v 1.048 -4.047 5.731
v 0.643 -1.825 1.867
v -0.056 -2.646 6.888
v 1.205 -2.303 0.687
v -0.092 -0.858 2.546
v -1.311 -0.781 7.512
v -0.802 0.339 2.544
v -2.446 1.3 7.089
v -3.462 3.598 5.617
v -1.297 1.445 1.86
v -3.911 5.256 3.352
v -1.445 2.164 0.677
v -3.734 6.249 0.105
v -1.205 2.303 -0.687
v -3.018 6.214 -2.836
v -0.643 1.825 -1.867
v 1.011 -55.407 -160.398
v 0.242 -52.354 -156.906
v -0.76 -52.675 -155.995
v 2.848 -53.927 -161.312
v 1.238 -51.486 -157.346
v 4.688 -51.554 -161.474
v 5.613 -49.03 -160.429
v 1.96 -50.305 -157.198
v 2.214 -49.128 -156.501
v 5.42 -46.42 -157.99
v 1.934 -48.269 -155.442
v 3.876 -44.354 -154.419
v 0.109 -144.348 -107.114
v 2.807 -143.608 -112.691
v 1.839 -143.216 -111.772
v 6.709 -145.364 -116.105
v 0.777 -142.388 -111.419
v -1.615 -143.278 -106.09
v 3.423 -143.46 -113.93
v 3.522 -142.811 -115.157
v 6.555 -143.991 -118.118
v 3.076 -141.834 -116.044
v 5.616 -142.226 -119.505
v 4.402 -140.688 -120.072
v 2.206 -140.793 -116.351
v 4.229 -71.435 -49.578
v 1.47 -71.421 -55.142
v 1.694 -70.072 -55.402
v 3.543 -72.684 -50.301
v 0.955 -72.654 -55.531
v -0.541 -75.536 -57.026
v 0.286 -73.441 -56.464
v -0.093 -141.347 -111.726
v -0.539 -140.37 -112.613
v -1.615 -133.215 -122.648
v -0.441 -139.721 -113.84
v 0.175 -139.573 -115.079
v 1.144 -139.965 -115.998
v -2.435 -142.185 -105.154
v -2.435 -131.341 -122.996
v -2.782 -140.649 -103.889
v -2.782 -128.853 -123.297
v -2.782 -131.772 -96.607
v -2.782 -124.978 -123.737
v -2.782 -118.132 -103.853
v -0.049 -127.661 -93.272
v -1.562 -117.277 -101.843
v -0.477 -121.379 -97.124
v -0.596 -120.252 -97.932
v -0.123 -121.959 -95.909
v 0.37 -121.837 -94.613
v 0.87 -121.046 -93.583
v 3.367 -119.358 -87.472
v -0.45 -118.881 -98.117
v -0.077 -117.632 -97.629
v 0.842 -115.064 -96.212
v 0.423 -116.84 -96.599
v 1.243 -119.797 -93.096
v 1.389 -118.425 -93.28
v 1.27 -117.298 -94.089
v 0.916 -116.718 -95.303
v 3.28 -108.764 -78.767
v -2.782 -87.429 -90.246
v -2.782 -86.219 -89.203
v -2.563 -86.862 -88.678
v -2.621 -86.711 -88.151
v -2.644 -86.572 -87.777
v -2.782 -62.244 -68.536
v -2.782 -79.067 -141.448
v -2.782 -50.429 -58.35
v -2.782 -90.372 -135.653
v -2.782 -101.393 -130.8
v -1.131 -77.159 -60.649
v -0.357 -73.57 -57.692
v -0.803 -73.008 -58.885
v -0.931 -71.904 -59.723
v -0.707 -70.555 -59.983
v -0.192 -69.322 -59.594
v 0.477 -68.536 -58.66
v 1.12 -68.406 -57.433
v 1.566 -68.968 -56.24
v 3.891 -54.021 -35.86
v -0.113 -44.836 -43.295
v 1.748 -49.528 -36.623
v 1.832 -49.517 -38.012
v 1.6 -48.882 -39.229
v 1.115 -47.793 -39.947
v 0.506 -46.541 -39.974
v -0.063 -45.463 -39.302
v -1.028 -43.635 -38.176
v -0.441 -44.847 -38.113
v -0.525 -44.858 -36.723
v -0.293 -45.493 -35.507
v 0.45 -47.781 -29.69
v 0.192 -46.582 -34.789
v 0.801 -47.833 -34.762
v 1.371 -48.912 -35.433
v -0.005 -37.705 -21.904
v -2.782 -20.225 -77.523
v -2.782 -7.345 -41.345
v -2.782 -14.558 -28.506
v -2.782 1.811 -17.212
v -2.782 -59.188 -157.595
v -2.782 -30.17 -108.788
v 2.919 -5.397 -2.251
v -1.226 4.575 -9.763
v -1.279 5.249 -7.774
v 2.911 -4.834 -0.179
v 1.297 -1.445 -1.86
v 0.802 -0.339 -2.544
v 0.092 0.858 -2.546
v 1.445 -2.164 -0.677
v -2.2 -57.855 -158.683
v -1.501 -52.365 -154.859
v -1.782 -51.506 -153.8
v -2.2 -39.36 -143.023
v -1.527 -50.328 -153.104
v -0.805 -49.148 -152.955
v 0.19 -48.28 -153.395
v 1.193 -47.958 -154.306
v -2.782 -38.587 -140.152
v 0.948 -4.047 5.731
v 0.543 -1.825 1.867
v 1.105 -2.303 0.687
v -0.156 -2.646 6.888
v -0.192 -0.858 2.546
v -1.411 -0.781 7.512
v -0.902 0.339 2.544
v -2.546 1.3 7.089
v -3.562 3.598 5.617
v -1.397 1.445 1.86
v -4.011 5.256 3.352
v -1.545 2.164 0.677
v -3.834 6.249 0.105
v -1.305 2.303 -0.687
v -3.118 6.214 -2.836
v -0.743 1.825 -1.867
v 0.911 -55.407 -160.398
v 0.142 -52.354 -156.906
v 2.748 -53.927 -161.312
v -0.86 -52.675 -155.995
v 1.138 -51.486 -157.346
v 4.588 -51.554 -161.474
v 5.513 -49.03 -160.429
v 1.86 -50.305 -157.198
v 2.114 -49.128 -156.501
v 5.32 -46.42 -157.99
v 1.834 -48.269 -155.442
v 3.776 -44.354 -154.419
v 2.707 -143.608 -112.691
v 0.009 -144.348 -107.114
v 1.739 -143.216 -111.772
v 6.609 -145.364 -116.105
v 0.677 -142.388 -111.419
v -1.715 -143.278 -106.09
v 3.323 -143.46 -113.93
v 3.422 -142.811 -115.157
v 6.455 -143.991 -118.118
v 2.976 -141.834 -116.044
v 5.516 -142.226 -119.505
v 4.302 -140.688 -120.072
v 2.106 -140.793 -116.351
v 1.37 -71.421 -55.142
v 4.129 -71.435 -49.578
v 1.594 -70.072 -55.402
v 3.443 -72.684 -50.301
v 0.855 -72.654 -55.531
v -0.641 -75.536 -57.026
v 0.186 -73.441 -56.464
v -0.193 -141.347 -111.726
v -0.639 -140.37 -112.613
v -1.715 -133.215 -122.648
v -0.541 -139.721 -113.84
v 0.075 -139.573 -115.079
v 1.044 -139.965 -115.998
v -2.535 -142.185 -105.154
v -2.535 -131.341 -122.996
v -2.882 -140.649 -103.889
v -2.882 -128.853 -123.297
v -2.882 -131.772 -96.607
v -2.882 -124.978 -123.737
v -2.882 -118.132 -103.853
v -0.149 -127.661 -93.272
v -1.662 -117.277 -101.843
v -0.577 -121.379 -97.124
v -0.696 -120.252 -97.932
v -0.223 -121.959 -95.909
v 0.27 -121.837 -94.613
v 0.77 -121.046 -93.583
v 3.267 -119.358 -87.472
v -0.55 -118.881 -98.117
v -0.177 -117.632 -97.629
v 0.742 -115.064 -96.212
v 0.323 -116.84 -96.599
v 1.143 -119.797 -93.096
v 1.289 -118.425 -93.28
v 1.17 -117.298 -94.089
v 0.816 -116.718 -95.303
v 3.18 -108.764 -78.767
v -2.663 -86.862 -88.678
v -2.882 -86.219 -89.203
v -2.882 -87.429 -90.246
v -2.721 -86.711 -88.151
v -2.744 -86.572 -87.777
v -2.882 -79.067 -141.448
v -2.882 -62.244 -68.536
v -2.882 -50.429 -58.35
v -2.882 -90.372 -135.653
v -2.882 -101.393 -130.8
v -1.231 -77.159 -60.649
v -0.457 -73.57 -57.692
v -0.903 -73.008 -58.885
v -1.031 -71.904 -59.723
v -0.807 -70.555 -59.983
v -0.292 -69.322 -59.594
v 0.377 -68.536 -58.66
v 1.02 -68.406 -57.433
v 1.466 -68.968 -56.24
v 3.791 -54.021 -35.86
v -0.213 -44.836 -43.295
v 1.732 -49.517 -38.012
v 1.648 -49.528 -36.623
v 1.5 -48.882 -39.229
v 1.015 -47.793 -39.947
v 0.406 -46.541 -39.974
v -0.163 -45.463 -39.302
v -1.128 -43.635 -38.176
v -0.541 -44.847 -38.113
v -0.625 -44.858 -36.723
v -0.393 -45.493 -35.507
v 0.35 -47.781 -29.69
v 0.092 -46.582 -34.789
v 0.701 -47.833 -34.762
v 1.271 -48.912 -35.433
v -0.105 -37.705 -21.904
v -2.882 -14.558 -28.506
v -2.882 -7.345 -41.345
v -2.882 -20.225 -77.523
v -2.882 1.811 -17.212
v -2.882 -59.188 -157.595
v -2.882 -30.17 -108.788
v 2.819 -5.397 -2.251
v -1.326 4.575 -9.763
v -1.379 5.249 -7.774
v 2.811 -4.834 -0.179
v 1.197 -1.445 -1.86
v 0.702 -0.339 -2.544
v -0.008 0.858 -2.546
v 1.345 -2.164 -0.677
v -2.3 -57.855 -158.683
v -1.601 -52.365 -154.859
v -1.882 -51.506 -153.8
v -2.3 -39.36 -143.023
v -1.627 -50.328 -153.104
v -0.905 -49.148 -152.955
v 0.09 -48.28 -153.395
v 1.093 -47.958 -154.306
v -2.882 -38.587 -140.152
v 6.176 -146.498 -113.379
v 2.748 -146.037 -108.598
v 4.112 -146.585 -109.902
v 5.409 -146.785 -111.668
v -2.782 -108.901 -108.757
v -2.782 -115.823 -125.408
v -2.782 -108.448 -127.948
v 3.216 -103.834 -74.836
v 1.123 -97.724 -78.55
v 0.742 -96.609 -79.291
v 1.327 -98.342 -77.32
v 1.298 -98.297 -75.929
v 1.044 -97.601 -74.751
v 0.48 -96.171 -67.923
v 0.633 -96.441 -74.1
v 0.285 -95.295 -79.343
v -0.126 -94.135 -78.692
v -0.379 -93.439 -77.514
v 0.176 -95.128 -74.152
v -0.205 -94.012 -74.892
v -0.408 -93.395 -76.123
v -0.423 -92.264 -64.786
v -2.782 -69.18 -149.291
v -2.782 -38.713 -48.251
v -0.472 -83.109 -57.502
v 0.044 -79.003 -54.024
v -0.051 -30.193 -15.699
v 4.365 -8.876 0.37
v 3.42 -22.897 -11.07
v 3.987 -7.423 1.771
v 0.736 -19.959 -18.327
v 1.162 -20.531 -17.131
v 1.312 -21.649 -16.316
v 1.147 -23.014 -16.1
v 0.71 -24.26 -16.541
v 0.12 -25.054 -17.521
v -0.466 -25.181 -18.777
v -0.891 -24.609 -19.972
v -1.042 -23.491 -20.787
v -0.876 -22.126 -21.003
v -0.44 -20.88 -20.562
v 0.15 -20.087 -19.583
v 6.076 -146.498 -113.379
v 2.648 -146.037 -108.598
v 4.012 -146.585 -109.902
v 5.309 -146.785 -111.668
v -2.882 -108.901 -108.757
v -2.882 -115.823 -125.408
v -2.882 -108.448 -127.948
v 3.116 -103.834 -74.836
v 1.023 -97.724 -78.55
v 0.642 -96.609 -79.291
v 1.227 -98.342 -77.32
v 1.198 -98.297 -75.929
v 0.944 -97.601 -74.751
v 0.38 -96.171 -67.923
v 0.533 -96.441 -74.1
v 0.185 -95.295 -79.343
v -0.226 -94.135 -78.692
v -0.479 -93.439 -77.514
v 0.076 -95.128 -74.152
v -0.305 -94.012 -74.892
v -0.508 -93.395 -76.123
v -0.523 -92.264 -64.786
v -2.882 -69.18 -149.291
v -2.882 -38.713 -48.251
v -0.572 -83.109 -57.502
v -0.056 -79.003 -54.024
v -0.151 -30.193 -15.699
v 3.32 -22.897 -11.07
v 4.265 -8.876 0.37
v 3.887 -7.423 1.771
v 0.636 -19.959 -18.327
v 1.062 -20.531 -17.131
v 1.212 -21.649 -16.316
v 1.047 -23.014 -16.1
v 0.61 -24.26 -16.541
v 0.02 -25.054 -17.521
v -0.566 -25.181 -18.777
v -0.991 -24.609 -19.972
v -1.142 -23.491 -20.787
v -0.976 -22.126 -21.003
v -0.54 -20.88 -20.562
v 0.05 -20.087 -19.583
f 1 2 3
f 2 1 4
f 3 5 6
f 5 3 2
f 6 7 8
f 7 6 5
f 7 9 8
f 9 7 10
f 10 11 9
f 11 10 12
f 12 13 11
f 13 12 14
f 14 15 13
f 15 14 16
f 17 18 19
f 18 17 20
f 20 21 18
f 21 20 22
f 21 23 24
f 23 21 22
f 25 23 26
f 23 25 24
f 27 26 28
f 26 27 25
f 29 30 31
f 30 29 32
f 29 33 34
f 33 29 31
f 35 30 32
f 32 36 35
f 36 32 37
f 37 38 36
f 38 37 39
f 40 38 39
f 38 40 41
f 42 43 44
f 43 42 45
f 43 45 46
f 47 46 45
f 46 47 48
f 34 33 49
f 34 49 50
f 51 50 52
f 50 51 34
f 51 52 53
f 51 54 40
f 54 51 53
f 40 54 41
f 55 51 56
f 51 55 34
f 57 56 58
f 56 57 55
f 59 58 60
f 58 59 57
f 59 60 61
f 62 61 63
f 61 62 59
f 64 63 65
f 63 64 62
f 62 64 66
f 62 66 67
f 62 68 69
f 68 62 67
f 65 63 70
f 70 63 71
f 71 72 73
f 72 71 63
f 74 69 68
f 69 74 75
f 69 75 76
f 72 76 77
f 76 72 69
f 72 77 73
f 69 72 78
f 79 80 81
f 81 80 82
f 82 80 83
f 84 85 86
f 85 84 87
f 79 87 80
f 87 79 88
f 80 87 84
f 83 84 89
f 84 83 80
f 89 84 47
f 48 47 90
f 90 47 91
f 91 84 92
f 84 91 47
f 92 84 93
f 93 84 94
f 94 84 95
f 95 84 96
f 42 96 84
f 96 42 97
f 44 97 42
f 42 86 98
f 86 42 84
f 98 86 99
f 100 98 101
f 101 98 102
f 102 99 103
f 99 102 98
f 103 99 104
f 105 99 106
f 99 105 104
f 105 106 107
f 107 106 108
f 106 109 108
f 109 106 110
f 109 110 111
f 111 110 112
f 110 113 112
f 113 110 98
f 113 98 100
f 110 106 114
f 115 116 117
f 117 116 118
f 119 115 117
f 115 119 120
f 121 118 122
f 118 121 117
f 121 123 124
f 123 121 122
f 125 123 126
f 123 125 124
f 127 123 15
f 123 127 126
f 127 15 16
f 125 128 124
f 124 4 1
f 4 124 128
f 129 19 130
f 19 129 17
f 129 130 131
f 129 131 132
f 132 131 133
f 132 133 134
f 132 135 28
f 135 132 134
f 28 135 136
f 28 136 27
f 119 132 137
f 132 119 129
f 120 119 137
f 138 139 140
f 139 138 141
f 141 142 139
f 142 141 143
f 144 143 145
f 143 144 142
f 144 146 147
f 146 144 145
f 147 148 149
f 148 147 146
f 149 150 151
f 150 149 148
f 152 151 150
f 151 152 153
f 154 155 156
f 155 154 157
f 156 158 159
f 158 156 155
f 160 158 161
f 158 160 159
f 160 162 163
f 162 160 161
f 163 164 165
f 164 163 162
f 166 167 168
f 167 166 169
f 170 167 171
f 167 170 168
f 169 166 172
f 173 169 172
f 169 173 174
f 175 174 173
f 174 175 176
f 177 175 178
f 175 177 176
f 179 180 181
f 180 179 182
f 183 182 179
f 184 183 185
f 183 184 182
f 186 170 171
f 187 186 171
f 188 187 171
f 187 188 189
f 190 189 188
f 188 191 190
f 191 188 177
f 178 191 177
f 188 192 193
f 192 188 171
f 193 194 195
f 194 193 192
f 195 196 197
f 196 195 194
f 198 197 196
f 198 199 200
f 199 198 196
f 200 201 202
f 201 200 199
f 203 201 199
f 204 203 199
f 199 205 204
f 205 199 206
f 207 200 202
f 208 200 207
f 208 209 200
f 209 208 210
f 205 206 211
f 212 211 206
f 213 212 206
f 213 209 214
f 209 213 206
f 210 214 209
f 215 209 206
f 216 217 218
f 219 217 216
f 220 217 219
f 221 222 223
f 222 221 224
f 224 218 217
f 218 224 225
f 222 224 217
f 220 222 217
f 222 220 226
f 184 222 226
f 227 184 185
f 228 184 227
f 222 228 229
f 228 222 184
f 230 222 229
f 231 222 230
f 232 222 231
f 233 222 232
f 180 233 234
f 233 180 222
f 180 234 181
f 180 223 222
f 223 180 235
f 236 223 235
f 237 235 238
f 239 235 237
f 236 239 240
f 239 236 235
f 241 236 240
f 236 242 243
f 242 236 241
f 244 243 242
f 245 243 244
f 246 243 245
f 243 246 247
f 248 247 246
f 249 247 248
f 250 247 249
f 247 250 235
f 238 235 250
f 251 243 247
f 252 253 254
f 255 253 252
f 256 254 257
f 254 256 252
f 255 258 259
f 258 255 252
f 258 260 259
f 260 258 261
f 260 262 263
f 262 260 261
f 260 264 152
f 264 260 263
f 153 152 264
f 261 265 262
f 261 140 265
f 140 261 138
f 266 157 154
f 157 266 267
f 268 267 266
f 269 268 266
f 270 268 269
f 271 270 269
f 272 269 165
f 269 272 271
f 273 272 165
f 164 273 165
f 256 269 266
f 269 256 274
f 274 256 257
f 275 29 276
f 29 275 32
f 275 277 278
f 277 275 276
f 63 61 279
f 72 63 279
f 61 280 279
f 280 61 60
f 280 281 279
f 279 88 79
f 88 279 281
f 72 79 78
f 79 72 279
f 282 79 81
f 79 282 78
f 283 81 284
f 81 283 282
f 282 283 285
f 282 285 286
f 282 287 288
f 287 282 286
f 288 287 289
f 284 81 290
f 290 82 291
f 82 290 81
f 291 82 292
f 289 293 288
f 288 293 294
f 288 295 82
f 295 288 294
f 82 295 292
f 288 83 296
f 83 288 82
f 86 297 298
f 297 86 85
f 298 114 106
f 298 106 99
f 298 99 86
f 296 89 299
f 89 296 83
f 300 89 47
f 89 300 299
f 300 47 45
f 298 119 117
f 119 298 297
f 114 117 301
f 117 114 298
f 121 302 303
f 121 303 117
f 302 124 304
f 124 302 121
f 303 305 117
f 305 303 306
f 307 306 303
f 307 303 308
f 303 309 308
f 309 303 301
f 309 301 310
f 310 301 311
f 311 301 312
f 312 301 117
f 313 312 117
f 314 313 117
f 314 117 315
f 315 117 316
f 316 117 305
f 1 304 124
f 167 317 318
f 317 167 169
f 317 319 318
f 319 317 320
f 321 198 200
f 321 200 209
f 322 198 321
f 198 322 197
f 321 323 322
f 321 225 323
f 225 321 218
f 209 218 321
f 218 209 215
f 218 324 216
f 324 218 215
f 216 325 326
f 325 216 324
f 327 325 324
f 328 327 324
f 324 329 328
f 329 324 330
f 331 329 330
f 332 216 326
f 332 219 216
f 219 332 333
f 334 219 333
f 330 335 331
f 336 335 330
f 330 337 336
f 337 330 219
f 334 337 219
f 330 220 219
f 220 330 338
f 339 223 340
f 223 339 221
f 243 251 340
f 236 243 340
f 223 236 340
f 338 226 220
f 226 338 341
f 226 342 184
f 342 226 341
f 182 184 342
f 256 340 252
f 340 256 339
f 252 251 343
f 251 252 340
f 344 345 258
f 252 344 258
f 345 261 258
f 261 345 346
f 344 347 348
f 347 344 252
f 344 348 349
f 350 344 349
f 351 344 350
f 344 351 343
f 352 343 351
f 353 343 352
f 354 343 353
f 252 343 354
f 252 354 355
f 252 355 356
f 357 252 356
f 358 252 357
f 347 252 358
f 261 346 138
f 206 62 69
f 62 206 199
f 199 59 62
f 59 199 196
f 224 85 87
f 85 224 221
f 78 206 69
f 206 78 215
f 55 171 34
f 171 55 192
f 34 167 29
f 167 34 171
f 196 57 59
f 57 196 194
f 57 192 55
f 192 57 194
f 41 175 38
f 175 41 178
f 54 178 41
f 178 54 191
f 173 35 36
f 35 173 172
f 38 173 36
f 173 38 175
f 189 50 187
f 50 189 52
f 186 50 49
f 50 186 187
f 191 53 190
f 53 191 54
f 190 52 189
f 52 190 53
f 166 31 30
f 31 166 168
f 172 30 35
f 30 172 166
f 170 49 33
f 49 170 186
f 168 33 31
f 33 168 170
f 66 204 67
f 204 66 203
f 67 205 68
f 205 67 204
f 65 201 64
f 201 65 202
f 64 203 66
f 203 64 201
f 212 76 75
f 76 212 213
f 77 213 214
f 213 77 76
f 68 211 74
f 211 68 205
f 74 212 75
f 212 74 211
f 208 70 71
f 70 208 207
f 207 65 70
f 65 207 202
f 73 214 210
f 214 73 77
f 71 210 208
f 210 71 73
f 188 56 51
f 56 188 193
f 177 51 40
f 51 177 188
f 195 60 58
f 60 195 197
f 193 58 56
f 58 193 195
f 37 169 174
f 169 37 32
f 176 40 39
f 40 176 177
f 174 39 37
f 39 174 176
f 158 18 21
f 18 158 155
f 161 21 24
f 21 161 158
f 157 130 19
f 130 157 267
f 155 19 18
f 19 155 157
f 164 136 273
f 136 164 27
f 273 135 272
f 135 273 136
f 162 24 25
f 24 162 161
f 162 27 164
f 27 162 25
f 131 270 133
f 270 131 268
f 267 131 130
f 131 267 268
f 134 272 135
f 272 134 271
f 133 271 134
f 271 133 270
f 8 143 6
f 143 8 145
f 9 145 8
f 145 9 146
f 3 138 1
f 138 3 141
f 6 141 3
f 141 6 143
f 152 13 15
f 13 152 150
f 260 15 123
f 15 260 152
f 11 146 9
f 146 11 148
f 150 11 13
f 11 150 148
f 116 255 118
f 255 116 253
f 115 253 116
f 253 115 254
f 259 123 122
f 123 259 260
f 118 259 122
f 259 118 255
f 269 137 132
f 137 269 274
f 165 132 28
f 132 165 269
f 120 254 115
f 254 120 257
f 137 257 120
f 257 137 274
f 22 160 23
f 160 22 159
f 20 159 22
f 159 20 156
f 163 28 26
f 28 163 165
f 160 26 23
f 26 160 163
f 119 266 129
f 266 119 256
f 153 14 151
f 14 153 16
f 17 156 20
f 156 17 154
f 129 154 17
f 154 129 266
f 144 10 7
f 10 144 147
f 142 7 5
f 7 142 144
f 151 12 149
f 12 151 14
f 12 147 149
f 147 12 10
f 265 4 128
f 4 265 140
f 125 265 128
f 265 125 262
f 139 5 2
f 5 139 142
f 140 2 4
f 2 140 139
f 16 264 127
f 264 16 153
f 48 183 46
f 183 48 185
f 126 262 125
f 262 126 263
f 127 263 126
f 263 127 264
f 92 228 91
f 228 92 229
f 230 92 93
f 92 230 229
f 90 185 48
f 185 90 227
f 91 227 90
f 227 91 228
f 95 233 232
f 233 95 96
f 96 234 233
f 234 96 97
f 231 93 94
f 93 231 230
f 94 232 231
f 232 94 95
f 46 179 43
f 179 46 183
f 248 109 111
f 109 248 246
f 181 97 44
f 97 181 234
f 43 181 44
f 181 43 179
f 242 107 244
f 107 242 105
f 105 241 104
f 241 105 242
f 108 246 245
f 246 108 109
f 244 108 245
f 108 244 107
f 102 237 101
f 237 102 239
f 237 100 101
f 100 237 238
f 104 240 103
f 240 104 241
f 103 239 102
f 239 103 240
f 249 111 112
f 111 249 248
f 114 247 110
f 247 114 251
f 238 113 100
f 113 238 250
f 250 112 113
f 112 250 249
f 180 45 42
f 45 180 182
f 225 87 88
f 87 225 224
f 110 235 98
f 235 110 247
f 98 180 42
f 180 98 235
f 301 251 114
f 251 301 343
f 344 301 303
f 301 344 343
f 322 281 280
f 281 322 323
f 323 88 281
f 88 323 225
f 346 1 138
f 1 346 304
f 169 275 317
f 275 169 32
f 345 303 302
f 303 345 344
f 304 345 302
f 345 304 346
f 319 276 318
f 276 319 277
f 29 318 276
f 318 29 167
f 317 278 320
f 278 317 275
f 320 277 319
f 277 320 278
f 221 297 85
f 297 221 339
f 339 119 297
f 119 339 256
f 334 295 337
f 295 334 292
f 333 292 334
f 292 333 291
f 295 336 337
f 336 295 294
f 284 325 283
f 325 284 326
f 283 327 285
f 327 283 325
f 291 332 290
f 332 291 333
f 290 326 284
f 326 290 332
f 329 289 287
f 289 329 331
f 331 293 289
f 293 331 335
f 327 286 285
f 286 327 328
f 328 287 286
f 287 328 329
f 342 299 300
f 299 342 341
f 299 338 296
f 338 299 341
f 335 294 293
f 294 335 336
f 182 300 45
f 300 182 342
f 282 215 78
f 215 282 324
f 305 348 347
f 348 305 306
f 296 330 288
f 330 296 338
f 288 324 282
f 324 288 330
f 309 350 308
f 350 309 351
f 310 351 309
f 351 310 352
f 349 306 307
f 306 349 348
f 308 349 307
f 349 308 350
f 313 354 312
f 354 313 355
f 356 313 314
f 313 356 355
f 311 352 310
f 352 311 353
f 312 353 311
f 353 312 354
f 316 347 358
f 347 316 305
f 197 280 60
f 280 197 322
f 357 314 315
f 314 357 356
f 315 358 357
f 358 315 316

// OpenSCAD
use <../lib.scad>
use <s/u9496c01s01.scad>
use <s/u9496c01s02.scad>
use <s/u9496c01s03.scad>
use <s/u9496c01s04.scad>
$fa=1; $fs=0.2;
function ldraw_lib__u9496p01c01(realsolid=false) = [
// 0 Sheet Fabric 15 x 22 Triangular Sail with Thick Stripes on White Background Pattern (Formed Shape 1)
// 0 Name: u9496p01c01.dat
// 0 Author: Philippe Hurbain [Philo]
// 0 !LDRAW_ORG Part UPDATE 2022-03
// 0 !LICENSE Licensed under CC BY 2.0 and CC BY 4.0 : see CAreadme.txt
// 
// 0 BFC CERTIFY CCW
  [0,"BFC","CERTIFY"],
  [0,"BFC","CCW"],
// 
// 0 !CATEGORY Sheet Fabric
// 0 !KEYWORDS Black Seas Barracuda, Caribbean Clipper, set 10040, Set 6274
// 0 !KEYWORDS set 6285, set 6286, Skull's Eye Schooner
// 
// 0 !HISTORY 2022-05-07 [PTadmin] Official Update 2022-03
// 
// 
// 1 16 0 0 0 1 0 0 0 1 0 0 0 1 s\u9496c01s01.dat
  [1,16,0,0,0,1,0,0,0,1,0,0,0,1, ldraw_lib__s__u9496c01s01(realsolid)],
// 0 BFC INVERTNEXT
  [0,"BFC","INVERTNEXT"],
// 1 16 -.25 0 0 1 0 0 0 1 0 0 0 1 s\u9496c01s01.dat
  [1,16,-.25,0,0,1,0,0,0,1,0,0,0,1, ldraw_lib__s__u9496c01s01(realsolid)],
// 
// 1 15 0 0 0 1 0 0 0 1 0 0 0 1 s\u9496c01s02.dat
  [1,15,0,0,0,1,0,0,0,1,0,0,0,1, ldraw_lib__s__u9496c01s02(realsolid)],
// 0 BFC INVERTNEXT
  [0,"BFC","INVERTNEXT"],
// 1 15 -.25 0 0 1 0 0 0 1 0 0 0 1 s\u9496c01s02.dat
  [1,15,-.25,0,0,1,0,0,0,1,0,0,0,1, ldraw_lib__s__u9496c01s02(realsolid)],
// 
// 1 16 0 0 0 1 0 0 0 1 0 0 0 1 s\u9496c01s03.dat
  [1,16,0,0,0,1,0,0,0,1,0,0,0,1, ldraw_lib__s__u9496c01s03(realsolid)],
// 1 15 0 0 0 1 0 0 0 1 0 0 0 1 s\u9496c01s04.dat
  [1,15,0,0,0,1,0,0,0,1,0,0,0,1, ldraw_lib__s__u9496c01s04(realsolid)],
];
module ldraw_lib__u9496p01c01(step=0, col=false, unit=2/5, alt=false, line=0.2, solid=!$preview)
    makepoly(ldraw_lib__u9496p01c01(solid), step=step, col=col, unit=unit, alt=alt, line=line, solid=solid);
ldraw_lib__u9496p01c01(line=0.2);
